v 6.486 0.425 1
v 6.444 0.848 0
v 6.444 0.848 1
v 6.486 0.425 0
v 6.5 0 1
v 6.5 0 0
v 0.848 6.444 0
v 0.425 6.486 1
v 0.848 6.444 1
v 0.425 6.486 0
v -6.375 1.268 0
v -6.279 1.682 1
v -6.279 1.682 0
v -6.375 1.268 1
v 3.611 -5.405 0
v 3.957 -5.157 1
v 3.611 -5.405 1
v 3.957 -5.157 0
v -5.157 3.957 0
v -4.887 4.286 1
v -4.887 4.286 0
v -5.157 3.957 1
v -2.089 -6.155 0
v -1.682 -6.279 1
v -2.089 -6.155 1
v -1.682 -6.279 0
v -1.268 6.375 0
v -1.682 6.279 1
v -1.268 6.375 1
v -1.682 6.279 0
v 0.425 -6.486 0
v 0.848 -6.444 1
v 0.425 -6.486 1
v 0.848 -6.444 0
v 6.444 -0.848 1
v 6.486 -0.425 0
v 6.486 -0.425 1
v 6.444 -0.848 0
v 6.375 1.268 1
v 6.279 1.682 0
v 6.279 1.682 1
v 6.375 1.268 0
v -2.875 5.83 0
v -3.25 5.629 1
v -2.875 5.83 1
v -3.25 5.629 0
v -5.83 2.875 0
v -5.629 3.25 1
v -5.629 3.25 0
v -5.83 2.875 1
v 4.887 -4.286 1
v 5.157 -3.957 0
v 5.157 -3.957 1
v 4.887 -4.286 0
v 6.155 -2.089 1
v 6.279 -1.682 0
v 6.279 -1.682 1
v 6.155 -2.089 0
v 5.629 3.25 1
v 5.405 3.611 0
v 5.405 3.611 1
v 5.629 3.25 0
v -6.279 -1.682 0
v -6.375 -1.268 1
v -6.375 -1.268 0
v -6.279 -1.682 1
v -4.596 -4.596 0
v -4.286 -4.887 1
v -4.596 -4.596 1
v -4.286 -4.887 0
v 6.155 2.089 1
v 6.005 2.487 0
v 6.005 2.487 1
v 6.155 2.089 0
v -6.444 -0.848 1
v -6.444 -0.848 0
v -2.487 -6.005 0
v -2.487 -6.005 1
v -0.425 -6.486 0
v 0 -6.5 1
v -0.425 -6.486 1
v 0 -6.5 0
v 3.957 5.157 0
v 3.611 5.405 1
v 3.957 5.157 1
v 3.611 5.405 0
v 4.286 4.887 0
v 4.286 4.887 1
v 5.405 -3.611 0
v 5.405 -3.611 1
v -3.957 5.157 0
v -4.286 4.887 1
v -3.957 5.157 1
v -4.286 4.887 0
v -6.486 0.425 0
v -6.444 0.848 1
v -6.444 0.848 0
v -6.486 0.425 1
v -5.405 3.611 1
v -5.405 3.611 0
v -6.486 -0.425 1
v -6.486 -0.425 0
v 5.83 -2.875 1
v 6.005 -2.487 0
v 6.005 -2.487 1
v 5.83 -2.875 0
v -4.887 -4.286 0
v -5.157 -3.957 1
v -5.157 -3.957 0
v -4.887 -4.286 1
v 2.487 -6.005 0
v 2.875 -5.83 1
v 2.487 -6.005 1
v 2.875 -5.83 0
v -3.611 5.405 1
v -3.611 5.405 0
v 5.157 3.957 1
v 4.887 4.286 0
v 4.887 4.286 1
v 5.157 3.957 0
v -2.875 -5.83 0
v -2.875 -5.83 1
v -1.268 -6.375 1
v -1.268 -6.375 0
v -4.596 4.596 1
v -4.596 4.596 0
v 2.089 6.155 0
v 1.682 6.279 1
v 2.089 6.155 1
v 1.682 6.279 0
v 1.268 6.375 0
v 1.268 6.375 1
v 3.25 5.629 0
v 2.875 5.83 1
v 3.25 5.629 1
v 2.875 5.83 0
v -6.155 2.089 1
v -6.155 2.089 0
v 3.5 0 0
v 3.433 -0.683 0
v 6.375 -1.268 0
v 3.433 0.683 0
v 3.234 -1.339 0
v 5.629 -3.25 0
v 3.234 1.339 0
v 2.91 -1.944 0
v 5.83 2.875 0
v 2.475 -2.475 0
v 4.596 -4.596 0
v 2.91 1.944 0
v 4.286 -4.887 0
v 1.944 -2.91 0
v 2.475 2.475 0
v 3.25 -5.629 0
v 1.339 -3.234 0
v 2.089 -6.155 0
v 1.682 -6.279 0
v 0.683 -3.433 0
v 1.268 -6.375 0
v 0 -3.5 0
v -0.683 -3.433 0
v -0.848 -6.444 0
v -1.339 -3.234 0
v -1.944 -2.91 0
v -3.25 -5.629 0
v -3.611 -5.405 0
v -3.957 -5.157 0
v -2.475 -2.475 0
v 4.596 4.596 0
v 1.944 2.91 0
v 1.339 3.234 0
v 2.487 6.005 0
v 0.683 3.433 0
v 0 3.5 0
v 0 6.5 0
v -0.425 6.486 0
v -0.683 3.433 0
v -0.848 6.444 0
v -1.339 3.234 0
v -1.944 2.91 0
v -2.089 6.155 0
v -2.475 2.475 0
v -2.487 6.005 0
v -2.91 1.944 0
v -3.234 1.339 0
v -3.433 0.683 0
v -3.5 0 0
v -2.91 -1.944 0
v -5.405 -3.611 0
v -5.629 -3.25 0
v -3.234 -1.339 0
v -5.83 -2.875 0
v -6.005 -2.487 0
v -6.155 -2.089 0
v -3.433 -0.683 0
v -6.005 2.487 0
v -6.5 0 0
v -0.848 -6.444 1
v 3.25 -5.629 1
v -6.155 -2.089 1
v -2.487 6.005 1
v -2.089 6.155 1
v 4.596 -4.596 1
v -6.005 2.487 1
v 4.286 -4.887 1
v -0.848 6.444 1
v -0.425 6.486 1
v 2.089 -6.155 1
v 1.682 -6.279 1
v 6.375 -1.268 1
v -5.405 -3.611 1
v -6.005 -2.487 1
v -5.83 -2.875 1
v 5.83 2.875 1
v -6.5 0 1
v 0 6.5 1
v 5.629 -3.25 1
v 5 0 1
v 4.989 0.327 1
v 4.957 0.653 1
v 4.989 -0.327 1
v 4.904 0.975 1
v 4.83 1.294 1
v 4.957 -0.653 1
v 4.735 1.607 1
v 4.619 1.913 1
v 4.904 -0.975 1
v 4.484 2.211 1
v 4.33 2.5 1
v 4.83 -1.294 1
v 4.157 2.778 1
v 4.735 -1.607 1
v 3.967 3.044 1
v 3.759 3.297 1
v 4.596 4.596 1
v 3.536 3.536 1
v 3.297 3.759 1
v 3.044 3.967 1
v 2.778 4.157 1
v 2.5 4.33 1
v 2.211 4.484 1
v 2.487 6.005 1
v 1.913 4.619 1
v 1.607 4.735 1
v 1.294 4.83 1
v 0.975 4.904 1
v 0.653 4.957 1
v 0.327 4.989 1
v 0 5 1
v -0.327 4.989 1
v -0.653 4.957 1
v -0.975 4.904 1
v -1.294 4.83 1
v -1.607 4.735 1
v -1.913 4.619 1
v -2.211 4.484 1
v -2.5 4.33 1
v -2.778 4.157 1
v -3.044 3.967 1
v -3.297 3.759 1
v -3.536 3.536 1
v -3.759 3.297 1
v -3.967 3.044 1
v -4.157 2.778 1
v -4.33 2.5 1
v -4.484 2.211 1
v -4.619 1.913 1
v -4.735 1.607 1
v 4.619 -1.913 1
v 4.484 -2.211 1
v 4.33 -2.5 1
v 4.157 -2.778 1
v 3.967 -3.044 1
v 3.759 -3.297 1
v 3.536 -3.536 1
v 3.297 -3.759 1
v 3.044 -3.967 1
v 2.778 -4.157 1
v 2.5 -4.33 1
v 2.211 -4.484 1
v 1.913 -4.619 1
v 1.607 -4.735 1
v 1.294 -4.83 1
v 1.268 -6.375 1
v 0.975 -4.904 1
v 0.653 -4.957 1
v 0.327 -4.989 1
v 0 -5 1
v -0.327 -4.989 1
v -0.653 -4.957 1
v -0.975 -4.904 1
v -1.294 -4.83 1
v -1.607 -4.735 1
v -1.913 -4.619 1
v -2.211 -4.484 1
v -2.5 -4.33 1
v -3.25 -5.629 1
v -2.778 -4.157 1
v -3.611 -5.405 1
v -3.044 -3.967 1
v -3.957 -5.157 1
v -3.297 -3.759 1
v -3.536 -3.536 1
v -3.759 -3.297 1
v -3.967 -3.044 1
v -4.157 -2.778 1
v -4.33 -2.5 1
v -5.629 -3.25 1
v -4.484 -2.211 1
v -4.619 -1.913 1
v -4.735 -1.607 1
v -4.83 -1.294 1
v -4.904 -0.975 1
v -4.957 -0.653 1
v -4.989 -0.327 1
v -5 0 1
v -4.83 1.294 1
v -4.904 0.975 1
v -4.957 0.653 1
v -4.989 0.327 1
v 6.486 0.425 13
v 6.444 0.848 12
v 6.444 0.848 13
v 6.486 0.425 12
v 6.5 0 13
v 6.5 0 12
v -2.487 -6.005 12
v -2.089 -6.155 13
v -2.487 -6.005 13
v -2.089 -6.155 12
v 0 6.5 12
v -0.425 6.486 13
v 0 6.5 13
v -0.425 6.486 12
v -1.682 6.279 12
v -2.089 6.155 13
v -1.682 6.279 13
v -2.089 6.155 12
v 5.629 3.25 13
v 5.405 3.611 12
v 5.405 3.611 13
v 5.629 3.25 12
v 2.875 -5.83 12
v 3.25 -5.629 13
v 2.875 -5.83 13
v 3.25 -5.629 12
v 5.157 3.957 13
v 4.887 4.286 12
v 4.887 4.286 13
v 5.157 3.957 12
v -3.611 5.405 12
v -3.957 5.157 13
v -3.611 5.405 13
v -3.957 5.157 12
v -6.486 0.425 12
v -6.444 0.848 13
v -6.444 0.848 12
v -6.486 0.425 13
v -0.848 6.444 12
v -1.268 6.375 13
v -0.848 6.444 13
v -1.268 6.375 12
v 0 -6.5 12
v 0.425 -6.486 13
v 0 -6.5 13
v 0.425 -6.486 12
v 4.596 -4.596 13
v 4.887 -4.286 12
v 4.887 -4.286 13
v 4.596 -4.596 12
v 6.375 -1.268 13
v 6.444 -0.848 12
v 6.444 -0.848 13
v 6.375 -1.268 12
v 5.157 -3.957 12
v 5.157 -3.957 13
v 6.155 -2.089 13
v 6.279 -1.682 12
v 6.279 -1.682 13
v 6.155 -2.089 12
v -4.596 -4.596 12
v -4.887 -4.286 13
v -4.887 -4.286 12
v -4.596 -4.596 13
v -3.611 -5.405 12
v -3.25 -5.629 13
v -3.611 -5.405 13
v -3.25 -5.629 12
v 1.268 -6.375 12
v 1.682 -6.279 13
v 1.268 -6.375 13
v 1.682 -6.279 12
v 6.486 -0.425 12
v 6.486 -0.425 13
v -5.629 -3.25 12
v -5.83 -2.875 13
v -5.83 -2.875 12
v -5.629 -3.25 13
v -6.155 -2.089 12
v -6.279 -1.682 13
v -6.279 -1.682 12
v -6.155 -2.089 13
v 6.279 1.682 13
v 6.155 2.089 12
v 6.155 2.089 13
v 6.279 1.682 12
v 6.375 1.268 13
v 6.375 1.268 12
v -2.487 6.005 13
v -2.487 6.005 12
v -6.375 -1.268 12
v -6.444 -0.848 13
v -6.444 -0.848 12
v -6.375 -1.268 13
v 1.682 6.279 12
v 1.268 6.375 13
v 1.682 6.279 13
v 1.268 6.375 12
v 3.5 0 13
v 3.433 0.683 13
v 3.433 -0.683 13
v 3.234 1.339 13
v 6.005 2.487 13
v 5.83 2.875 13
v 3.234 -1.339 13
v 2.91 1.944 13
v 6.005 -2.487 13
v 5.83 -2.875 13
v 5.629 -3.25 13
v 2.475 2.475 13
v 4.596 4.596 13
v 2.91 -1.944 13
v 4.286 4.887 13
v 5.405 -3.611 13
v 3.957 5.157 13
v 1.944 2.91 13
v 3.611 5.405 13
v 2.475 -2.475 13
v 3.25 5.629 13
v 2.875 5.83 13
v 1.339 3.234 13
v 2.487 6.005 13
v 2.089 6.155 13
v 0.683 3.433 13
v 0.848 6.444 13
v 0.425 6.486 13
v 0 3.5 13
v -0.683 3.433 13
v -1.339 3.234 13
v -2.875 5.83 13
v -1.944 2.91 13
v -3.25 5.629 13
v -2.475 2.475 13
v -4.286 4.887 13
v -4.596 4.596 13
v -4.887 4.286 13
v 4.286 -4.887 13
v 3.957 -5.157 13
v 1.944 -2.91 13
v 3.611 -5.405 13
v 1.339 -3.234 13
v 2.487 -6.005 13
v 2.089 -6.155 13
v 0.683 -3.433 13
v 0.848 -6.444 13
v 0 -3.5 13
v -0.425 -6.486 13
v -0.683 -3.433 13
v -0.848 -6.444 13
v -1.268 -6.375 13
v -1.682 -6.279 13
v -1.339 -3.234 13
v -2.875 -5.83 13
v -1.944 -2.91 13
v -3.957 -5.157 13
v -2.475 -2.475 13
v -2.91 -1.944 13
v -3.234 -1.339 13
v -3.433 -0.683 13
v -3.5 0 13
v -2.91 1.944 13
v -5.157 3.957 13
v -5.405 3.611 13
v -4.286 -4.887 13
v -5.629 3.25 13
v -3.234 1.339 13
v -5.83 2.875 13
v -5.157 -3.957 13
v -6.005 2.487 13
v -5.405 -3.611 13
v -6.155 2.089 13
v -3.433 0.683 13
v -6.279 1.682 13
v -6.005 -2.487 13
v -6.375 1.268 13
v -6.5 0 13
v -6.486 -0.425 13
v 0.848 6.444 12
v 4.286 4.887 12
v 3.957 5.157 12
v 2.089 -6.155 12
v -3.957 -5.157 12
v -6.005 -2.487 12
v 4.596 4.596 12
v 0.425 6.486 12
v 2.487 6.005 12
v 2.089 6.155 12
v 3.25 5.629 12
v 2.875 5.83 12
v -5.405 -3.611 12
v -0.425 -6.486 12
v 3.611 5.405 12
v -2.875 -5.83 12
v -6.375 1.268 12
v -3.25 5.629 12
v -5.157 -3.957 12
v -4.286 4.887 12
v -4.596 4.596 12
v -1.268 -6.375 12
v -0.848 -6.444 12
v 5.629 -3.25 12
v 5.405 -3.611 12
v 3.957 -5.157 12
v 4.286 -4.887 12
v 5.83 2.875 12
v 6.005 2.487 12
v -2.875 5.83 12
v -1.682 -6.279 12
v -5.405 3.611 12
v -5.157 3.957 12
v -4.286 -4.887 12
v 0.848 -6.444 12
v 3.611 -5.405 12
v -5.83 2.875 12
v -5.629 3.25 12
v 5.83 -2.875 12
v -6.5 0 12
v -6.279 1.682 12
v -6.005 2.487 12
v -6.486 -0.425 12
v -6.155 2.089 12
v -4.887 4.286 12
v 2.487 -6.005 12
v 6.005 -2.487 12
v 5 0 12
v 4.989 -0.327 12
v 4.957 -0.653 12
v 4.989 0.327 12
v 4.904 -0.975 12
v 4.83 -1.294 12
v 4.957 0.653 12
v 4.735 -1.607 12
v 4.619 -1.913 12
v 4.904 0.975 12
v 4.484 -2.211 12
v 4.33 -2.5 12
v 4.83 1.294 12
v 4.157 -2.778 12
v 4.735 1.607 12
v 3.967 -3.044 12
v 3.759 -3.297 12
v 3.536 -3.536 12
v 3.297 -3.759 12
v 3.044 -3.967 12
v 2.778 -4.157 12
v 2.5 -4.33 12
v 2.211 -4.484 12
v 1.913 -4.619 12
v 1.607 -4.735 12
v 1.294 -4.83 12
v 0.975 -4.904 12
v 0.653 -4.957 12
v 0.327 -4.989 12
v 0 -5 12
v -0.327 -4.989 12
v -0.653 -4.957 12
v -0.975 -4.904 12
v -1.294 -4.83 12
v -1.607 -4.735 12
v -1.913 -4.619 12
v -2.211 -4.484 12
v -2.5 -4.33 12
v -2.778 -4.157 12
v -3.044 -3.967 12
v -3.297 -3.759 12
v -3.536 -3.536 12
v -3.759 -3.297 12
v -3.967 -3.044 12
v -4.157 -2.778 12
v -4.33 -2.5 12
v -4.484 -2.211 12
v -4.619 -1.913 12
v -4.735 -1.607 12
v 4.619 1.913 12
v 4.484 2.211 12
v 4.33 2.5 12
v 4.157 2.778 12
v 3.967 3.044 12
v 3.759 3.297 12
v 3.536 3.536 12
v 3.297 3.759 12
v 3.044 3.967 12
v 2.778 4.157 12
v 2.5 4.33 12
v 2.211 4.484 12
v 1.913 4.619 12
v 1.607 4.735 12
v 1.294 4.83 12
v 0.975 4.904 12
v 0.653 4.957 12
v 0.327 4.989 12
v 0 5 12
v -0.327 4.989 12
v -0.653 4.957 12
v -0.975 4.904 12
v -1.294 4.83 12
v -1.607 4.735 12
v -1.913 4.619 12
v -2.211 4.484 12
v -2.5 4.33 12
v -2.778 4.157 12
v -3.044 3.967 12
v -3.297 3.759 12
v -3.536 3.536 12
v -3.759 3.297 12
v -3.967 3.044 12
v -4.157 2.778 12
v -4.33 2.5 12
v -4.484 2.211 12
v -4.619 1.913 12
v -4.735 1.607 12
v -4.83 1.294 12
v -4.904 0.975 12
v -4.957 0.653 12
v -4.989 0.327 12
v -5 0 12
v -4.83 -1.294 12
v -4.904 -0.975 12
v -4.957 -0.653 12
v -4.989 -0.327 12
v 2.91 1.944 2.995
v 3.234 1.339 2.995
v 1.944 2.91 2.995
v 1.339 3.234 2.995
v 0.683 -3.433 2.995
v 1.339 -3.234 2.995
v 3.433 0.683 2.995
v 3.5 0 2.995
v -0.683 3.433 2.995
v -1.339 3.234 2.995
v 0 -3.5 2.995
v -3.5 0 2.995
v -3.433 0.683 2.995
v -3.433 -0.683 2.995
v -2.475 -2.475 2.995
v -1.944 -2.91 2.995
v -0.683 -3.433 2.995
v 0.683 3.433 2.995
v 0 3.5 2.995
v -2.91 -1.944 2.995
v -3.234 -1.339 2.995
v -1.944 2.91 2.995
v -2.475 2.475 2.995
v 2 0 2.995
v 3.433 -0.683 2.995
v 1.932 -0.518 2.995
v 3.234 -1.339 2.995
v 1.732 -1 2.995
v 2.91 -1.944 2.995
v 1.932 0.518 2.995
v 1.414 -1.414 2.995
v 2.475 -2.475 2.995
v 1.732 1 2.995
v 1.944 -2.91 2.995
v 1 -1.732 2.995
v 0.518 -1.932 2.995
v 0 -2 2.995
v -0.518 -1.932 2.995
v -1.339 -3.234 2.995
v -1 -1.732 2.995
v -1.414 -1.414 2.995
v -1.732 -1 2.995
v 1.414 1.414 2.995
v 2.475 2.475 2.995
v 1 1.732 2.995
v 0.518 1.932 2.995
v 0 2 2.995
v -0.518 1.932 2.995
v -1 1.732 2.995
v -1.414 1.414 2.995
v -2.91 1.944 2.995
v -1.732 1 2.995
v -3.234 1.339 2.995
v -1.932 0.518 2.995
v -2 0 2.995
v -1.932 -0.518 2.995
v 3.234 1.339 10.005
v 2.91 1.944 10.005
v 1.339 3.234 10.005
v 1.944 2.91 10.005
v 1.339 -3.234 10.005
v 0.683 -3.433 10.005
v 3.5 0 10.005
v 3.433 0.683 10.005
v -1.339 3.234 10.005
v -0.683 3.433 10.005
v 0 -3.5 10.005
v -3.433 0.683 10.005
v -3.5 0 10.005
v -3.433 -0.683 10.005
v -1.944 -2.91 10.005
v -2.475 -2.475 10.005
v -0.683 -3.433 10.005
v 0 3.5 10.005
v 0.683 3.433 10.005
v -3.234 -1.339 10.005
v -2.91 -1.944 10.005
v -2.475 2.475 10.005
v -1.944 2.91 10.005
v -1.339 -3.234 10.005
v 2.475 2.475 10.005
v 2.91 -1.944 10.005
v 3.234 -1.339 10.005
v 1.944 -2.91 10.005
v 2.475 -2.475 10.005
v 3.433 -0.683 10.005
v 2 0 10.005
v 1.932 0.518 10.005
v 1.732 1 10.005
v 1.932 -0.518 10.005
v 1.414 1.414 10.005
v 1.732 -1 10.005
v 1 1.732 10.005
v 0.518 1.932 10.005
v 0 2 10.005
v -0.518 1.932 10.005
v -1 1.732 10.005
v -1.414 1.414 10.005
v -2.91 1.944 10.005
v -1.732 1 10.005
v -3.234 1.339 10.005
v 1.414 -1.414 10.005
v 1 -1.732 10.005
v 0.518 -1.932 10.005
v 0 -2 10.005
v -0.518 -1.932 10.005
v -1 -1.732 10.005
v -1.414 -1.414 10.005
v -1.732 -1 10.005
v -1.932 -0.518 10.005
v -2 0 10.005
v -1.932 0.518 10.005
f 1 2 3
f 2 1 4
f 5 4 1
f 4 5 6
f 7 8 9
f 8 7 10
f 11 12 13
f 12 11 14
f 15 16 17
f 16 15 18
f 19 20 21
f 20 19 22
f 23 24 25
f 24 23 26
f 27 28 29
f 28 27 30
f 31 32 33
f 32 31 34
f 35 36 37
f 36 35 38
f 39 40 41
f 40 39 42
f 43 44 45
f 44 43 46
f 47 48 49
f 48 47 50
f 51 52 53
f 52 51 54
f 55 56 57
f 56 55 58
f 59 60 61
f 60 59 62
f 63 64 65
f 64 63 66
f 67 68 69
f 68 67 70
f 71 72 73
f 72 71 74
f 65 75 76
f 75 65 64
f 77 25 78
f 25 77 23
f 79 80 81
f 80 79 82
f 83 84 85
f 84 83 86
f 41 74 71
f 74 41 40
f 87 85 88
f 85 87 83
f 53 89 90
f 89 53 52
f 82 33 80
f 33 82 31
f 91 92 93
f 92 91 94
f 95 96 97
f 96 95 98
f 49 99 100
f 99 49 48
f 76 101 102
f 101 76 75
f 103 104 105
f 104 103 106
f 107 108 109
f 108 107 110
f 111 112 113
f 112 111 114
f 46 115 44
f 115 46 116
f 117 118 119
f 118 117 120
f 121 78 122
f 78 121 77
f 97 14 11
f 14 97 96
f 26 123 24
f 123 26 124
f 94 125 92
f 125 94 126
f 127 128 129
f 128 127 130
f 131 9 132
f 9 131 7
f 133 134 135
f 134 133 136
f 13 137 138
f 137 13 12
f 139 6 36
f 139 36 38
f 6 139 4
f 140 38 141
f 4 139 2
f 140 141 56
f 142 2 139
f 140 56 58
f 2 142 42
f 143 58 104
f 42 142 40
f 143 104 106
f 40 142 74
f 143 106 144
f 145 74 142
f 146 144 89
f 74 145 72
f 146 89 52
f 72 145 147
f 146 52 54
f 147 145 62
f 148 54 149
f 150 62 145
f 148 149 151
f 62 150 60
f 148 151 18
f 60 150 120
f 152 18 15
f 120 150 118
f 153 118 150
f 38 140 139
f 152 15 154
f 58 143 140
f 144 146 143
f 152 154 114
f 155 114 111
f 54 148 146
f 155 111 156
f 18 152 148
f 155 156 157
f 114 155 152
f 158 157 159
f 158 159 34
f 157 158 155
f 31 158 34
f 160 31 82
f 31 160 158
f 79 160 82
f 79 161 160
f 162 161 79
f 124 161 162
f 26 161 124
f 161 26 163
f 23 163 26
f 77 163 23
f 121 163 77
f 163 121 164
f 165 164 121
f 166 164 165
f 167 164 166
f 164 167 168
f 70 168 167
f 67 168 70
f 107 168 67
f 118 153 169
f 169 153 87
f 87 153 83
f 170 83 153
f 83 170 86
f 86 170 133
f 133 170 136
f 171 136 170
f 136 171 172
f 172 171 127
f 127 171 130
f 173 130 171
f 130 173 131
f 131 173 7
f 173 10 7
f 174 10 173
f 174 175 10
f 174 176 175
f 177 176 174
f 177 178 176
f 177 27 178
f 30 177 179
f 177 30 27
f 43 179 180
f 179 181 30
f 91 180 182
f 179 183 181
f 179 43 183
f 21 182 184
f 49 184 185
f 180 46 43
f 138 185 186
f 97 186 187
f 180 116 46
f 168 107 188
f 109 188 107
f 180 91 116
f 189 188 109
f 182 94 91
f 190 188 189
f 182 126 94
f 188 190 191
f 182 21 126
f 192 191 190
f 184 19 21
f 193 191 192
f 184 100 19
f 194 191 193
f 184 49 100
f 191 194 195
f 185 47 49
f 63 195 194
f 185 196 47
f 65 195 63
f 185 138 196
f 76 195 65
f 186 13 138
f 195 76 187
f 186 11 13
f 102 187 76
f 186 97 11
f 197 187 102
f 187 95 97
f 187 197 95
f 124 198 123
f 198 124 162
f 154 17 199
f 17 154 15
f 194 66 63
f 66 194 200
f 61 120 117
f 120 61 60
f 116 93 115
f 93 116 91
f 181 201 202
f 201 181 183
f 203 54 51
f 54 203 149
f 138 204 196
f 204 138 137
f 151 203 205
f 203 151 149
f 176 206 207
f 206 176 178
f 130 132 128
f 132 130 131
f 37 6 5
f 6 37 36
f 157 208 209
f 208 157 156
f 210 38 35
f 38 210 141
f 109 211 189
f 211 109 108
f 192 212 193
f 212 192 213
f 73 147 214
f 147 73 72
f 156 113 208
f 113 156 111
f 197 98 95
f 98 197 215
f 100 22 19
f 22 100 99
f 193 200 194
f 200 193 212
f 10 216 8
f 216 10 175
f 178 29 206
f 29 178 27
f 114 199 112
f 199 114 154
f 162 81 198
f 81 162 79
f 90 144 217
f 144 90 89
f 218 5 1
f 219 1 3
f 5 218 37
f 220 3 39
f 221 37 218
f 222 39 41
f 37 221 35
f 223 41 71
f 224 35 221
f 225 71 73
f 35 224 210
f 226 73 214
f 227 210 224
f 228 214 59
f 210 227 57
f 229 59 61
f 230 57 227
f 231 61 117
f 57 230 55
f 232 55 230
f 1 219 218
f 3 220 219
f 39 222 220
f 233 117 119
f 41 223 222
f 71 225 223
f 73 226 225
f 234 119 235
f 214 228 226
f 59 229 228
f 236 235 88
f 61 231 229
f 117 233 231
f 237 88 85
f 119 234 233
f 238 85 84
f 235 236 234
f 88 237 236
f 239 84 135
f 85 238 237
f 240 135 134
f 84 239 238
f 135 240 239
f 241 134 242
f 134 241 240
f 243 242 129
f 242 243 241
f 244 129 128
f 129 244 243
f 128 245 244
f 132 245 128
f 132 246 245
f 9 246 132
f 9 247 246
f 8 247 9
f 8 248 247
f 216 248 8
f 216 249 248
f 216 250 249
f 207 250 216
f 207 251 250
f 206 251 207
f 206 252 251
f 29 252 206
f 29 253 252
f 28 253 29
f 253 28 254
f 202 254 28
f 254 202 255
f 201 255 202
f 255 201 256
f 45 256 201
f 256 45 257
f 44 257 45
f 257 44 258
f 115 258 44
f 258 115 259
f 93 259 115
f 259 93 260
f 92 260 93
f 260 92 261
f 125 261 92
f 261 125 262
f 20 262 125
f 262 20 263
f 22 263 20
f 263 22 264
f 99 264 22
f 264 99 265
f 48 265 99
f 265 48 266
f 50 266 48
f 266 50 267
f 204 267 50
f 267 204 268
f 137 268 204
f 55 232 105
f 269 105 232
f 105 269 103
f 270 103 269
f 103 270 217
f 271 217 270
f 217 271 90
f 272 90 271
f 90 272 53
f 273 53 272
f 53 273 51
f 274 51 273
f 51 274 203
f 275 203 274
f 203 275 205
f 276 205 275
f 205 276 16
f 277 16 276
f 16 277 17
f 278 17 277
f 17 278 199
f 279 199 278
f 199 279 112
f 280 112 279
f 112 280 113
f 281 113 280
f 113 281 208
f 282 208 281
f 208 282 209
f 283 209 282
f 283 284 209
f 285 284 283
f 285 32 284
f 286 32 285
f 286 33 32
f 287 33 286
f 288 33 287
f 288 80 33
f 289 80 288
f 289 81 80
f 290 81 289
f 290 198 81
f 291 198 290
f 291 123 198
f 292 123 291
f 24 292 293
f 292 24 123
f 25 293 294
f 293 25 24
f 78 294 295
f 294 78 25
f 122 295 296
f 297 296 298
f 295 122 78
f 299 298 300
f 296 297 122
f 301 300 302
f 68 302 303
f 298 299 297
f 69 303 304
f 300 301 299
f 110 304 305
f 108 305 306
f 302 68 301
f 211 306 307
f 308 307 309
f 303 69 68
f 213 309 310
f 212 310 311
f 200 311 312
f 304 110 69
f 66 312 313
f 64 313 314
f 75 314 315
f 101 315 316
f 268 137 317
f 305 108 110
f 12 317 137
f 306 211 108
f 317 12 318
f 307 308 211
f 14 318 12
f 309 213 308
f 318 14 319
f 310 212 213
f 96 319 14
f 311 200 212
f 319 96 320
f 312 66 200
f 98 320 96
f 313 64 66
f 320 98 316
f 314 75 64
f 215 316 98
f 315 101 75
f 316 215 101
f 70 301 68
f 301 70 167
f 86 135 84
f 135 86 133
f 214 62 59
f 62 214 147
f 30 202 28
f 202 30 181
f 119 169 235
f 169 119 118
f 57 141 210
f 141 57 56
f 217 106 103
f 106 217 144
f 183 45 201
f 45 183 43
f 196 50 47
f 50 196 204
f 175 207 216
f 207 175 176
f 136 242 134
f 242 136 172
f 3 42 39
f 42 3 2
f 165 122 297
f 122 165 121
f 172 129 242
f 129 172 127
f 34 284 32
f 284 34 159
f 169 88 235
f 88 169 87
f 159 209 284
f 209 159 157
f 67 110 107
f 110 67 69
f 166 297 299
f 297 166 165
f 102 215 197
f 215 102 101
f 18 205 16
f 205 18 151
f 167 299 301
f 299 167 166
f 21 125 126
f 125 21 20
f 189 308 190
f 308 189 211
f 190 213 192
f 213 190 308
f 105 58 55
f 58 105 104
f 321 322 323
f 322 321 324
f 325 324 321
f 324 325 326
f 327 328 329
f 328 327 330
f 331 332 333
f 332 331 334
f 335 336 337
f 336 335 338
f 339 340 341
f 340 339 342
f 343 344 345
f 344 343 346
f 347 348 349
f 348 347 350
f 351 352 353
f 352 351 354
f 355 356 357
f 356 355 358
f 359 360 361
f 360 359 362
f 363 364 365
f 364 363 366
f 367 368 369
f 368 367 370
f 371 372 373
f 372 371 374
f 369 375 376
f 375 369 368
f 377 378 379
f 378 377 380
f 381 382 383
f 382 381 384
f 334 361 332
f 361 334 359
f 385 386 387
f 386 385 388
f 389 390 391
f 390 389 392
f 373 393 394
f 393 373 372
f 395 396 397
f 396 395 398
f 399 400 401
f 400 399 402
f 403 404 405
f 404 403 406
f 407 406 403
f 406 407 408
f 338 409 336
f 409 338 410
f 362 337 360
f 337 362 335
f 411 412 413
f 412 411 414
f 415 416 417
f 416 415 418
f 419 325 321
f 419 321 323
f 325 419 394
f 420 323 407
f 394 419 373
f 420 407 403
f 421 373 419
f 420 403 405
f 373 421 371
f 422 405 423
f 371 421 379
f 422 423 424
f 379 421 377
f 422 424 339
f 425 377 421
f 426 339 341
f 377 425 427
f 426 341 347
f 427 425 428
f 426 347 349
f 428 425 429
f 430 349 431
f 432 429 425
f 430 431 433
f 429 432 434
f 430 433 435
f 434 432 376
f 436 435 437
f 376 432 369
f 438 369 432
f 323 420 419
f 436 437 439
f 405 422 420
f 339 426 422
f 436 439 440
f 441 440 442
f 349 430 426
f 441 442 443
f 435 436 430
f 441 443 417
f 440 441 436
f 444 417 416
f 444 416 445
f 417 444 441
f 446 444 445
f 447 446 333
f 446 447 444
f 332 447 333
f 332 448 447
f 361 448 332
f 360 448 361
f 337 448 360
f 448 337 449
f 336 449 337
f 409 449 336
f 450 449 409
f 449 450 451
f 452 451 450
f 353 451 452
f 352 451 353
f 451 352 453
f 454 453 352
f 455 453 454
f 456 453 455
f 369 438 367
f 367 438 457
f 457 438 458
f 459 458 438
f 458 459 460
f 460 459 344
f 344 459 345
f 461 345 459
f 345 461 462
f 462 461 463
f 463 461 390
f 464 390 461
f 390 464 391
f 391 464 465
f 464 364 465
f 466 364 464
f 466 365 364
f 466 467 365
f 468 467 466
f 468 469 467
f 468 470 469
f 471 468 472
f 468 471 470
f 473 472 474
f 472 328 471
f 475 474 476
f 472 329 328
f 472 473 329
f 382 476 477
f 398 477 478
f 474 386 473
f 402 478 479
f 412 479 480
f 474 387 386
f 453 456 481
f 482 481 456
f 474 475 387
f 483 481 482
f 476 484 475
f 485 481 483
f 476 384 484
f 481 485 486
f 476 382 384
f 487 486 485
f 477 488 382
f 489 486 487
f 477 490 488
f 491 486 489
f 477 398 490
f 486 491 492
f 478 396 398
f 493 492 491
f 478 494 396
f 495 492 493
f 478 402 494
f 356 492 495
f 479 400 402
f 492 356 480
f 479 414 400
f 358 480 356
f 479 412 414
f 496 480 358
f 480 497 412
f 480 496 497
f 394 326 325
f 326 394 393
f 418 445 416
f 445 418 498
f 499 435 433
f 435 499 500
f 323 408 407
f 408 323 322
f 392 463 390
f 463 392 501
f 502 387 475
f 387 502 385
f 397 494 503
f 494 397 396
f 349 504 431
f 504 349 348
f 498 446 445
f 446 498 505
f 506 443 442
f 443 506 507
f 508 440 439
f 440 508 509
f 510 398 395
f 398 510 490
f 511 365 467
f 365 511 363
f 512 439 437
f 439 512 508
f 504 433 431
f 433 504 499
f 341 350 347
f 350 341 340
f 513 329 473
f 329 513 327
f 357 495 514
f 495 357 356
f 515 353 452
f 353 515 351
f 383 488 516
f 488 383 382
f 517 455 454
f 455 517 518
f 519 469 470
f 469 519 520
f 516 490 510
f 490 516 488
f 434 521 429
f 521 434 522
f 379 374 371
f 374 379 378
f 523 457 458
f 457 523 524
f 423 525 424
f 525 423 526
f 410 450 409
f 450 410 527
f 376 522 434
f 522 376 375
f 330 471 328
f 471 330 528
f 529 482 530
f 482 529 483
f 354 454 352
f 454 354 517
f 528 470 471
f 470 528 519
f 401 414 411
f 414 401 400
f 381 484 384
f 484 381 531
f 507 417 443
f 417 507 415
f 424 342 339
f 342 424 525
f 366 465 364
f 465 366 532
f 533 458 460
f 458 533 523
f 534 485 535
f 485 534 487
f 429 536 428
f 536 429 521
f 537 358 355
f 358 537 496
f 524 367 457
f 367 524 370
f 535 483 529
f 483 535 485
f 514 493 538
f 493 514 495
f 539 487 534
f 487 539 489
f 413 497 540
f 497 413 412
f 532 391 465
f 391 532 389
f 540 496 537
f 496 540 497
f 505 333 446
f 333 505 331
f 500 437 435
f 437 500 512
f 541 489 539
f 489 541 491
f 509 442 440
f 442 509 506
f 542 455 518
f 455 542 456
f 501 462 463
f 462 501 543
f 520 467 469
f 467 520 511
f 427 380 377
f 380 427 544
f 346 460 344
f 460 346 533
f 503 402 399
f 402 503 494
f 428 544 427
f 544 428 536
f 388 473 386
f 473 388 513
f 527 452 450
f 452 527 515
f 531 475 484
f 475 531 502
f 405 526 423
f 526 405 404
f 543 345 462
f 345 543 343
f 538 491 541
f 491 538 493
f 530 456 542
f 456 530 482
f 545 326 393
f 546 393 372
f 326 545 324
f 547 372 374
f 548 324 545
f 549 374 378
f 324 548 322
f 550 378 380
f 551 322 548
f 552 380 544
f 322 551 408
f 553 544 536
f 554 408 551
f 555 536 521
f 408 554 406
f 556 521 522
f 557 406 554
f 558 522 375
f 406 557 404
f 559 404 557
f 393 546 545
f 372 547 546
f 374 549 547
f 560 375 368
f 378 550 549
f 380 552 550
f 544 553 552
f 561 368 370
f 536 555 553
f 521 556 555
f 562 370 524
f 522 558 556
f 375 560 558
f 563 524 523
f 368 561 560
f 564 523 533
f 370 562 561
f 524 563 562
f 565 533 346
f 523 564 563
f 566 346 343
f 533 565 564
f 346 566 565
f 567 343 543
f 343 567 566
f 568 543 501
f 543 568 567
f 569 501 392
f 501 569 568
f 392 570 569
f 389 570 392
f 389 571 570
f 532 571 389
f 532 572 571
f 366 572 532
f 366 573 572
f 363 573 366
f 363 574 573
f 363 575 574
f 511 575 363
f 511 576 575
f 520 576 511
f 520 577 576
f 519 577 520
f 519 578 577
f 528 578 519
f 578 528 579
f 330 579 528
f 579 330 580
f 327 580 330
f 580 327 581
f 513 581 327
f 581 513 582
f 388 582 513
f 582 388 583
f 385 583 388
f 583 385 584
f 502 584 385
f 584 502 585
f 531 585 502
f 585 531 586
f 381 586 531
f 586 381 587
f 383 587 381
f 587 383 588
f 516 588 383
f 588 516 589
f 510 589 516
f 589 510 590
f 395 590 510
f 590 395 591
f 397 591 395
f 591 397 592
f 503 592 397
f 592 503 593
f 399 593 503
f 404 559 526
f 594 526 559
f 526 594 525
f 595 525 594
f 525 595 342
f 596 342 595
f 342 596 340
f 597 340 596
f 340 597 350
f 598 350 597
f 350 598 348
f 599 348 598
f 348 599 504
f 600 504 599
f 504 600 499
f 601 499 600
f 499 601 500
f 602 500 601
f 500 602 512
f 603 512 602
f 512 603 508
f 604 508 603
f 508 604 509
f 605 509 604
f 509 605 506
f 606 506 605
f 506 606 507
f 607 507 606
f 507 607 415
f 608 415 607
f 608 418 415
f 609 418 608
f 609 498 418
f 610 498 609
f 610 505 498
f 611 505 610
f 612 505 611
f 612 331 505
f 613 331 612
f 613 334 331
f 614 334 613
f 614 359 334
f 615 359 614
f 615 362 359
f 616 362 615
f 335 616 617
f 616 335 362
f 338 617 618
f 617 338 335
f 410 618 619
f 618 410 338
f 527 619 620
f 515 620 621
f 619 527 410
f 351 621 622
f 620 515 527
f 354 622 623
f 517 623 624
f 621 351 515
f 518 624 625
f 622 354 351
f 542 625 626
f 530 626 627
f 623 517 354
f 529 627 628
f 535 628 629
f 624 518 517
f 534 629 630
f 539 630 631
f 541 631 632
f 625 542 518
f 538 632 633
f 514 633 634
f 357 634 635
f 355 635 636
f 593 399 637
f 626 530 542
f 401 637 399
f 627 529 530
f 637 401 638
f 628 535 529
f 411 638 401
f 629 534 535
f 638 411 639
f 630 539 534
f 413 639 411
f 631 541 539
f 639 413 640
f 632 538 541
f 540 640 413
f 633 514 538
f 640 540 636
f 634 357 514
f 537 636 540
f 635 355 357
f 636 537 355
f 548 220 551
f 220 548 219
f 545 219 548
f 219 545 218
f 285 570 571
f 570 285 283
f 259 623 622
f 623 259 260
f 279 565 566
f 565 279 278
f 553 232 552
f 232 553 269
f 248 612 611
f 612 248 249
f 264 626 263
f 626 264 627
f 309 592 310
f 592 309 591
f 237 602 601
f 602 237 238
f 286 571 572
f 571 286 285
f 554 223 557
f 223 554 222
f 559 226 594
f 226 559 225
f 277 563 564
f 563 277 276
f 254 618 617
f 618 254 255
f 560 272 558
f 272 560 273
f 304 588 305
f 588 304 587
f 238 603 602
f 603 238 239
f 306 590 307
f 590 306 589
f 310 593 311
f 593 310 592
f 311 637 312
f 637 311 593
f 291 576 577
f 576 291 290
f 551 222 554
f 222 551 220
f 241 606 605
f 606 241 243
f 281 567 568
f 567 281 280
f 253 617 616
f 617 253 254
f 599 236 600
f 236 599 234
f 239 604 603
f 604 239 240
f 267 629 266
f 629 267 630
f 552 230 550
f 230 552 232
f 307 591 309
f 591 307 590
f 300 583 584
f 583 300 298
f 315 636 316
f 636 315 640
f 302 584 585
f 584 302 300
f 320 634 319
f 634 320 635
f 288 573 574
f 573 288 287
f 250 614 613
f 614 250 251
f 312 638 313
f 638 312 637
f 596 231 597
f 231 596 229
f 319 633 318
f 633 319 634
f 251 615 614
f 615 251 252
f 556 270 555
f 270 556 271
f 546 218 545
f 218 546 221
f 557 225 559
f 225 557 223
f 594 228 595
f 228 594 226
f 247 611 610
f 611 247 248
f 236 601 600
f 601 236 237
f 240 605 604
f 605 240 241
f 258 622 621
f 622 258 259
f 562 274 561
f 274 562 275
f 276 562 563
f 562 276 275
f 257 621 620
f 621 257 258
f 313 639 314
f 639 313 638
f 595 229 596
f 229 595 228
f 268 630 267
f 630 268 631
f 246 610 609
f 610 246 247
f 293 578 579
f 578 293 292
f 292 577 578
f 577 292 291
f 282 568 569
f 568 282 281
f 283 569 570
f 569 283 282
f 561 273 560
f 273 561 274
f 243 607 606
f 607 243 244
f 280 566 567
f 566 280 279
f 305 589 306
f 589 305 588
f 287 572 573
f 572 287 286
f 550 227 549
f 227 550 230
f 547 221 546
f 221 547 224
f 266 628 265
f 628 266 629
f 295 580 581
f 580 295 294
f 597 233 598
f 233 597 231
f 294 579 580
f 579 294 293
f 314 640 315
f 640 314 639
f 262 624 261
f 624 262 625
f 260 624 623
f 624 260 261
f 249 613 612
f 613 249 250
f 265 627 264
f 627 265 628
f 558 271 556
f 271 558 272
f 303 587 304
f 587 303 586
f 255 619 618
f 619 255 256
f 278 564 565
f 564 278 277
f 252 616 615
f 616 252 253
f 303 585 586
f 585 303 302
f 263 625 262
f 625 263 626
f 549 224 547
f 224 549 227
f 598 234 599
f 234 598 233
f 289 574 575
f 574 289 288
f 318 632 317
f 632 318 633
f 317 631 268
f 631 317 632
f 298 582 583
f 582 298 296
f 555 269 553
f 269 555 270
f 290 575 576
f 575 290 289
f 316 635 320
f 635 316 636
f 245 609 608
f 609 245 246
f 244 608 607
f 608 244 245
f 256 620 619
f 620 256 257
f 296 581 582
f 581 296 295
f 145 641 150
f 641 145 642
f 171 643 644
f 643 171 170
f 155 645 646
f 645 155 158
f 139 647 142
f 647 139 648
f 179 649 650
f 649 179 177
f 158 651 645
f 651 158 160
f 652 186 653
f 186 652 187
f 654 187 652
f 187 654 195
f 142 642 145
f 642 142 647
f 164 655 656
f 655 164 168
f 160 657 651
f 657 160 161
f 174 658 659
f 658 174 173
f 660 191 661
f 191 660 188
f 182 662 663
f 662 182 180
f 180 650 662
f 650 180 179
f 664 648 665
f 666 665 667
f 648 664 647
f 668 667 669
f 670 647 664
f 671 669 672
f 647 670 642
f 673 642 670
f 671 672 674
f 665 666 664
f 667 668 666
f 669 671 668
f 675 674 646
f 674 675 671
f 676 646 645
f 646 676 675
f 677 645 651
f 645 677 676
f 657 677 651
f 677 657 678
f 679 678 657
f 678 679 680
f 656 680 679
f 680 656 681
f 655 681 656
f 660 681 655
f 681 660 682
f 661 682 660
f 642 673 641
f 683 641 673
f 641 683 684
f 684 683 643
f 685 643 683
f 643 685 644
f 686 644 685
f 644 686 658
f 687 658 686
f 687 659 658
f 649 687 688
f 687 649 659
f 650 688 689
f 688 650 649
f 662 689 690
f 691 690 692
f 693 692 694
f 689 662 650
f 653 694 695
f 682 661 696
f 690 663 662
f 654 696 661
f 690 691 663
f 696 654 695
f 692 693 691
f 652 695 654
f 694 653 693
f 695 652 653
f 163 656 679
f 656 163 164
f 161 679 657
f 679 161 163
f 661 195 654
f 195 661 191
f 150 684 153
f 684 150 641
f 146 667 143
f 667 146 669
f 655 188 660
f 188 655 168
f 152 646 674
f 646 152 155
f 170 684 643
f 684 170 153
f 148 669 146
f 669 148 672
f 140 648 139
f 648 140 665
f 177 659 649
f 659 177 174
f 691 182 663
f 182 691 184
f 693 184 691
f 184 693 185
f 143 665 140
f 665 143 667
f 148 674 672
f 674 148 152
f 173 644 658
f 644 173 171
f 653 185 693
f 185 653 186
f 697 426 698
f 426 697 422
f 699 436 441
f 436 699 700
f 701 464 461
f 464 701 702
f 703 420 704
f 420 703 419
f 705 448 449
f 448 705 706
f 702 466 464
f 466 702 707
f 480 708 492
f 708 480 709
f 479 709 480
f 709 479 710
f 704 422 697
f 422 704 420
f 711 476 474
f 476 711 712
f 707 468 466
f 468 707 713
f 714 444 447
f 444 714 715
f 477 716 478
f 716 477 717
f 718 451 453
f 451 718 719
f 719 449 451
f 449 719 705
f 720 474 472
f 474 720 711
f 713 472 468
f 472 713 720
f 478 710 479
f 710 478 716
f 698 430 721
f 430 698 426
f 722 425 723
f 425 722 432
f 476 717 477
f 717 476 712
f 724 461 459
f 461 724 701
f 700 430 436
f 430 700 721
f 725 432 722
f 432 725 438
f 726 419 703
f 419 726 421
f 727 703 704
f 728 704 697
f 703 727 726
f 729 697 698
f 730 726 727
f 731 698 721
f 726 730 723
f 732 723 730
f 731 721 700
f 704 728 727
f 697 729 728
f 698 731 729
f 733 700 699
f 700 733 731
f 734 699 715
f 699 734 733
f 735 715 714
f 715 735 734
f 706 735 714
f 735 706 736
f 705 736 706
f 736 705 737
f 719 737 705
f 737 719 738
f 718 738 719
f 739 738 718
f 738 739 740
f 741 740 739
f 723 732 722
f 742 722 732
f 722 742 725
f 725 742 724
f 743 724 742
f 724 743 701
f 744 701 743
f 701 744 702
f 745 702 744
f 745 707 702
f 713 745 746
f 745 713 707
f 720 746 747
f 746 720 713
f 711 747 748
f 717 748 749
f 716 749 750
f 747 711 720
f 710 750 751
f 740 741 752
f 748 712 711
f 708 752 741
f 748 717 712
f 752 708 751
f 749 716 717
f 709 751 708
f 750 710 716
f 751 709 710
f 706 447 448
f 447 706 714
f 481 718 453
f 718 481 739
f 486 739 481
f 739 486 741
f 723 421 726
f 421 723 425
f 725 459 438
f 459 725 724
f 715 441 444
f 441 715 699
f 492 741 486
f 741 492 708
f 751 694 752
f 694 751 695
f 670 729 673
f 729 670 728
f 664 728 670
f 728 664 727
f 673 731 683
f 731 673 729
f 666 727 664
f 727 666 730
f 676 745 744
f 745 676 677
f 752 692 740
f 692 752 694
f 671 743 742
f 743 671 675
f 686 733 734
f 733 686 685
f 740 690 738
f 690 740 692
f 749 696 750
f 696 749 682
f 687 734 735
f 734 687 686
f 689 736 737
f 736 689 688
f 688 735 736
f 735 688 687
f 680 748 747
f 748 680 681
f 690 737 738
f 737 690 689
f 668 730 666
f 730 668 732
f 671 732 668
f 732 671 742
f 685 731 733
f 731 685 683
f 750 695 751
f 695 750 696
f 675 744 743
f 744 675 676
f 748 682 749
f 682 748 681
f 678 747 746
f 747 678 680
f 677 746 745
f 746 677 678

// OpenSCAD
// file: wrist_params.scad
// Shared parameters and helpers for the belt-driven wrist.
// Every part file includes this, so change values here.
//
// Frames (mm):
//   origin = intersection of the pitch and roll axes
//   pitch axis = X  (yoke turns in the two legs on 6709 bearings)
//   roll  axis = yoke Z (cup turns in the yoke on 6709 bearings)
//   legs clamp onto a vertical 20x20 square rod along -Z
//   pitch side = -X (pulley outside the left leg)
//   roll side  = +X (belt leaves through the hollow right stub)
//
// Roll belt path: cup drum -> yoke idler -> along the pitch axis through the
// right stub -> leg idler -> down to the roll motor, and back the same way on
// the other side. Both runs lie along the pitch axis, so pitching the yoke only
// twists them and does not turn the cup.

$fn = 96;

/* [Bearings] */
b6709 = [45, 55, 6];        // main bearings, 6709-2RS (bore, OD, width), x4
idler_bearing = [3, 7, 3];  // 7x3x3 (bore, OD, width), two per idler
fit = 0.0;                  // extra clearance added to bearing seats

/* [HTD 5M belt] */
belt_pitch = 5;
roll_belt_w  = 10;
pitch_belt_w = 10;         // same as elbow/pulleys.scad
function band_h(w) = w + 1.5;   // toothed band on pulleys, as in elbow/pulleys.scad
roll_band_h  = band_h(roll_belt_w);
pitch_band_h = band_h(pitch_belt_w);
htd_pld    = 0.5715;        // pitch line to pulley outer diameter
htd_depth  = 2.06;          // tooth depth
htd_groove_r = 1.49;
belt_back  = 1.17;          // pitch line to back of belt
belt_tip   = htd_pld + htd_depth;  // pitch line to tooth tips

drum_teeth  = 30;           // roll drum on the cup
pitch_teeth = 60;           // pitch pulley on the yoke shaft; 3:1 with a 20T motor pulley
motor_teeth = 20;           // motor pulleys (for belt lengths and the assembly view)
motor_drop  = 150;          // motor shafts below the pitch axis

/* [Idlers] */
idler_r      = 5;           // belt contact radius (smooth)
idler_flange = 1.5;         // flange overhang
idler_band   = roll_belt_w + 1;
idler_fl_t   = 1;
idler_w      = idler_band + 2 * idler_fl_t;

/* [Yoke] */
yoke_r        = b6709[1] / 2 + 6.5;  // outer radius of the ring
yoke_chamfer  = [2.7, 3.5];          // outer edge chamfer (radial, axial)
cup_bearing_z = 13.5;                 // cup bearing centres, +/- from the pitch axis
yoke_h        = 2 * (cup_bearing_z + b6709[2] / 2 + 2);   // 2 mm lips over the bearings

/* [Roll belt routing] */
run_y      = 10.5;          // pitch lines of the two roll runs, +/- from the pitch axis;
                            // the runs pass closest at mid-twist at pitch +/-90 (belt_check both_runs)
yoke_idler = [yoke_r - 6, run_y + belt_back + idler_r];   // yoke frame (x, +/-y), axis = yoke Z
// Twist length, yoke idler to leg idler. Edge stretch at 180 deg of twist
// (pitch -90) is about 3.4 % for a 10 mm belt; 80 would bring it to 1.9 %.
twist_len  = 60;
leg_idler  = [yoke_idler.x + twist_len, -(idler_r + (belt_tip + belt_back) / 2)];  // (x, z), axis = Y
yoke_block_y = yoke_idler.y + idler_r + idler_flange + 1.5;  // half width of the blocks either side of the ring

assert(run_y - idler_w / 2 >= 2, "roll leg idlers hit the centre rib, raise run_y");

/* [Pins] */
pin_d      = 3;
pin_hole_d = 2.9;           // press fit in the roll leg

/* [Mounting rod] */
rod_w   = 20;
rod_gap = rod_w + 0.2;
rod_len = 200;

/* [Shared positions] */
leg_x         = [yoke_r + 3, yoke_r + 3 + b6709[2] + 5];   // leg disc inner / outer face
pitch_pulley_x = leg_x[1] + 1;  // pulley starts this far out on the -X side
pitch_shaft_r  = b6709[0] / 2 - 2.5;   // shaft the pulley slides onto
pitch_screw_pcd = 24;       // 3x M3 axial screws, pulley -> shaft end
pitch_fl_t     = 1.5;
pitch_plate_t  = 3;
pitch_pulley_len = 2 * pitch_fl_t + pitch_band_h;
pitch_shaft_end  = pitch_pulley_x + pitch_pulley_len;

// furthest the yoke ring reaches from the pitch axis at x, over any pitch angle
function yoke_sweep_r(x) = sqrt(max(0, pow(yoke_r, 2) + pow(yoke_h / 2 - yoke_chamfer[1], 2) - x * x));
rod_top = -round(yoke_sweep_r(0) + 2.5);

// rod clamp on each leg: 2x2 M3, top row this far below the rod top
rod_bolt_pitch = 11;        // square, centre to centre
rod_bolt_top   = 6;
rod_bolt_edge  = 12;        // lower bolt centres to the bottom of the leg
leg_bottom = rod_top - rod_bolt_top - rod_bolt_pitch - rod_bolt_edge;

eps = 0.01;

// ---------------------------------------------------------------- HTD 5M

function htd_rp(t) = t * belt_pitch / (2 * PI);
function htd_ro(t) = htd_rp(t) - htd_pld;
function htd_root(t) = htd_ro(t) - htd_depth;

// toothed disc, same profile as elbow/htd-pulley.scad
module htd_teeth(t, h, center = false) {
    linear_extrude(h, center = center) difference() {
        circle(r = htd_ro(t), $fn = max(36, t * 4));
        for (i = [0 : t - 1]) rotate(i * 360 / t)
            translate([htd_ro(t) - htd_depth + htd_groove_r, 0]) circle(r = htd_groove_r, $fn = 16);
    }
}

// ---------------------------------------------------------------- roll belt geometry
// Crossed tangent from the drum (pitch circle) to the +y yoke idler.
// Returns [point on drum, point on idler], yoke frame, z = 0.

function roll_tangent() = let(
    c = yoke_idler, R = htd_rp(drum_teeth), rho = idler_r + belt_back,
    d = norm(c), b = atan2(c.y, c.x),
    g = b - acos(-(R + rho) / d), n = [cos(g), sin(g)])
    [-R * n, c + rho * n];

assert(norm(yoke_idler) > htd_rp(drum_teeth) + idler_r + belt_back,
       "yoke idler too close to the drum");
assert(norm(yoke_idler) > htd_ro(drum_teeth) + 1 + idler_r + idler_flange + 0.5,
       "yoke idler hits the drum flange");

function roll_belt_length() = let(
    t = roll_tangent(), R = htd_rp(drum_teeth), rho = idler_r + belt_back,
    a1 = atan2(t[0].y, t[0].x),
    drum = R * (360 - 2 * a1) * PI / 180,
    seg = norm(t[1] - t[0]),
    ia = 270 - (atan2(t[1].y - yoke_idler.y, t[1].x - yoke_idler.x) + 360) % 360,
    idl = rho * ia * PI / 180,
    xrun = leg_idler.x - yoke_idler.x,
    lrho = -leg_idler.y,
    leg = lrho * PI / 2,
    rm = htd_rp(motor_teeth),
    down = norm([motor_drop + leg_idler.y, rm - run_y]),
    mot = PI * rm)
    drum + mot + 2 * (seg + idl + xrun + leg + down);

function pitch_belt_length() = let(r1 = htd_rp(pitch_teeth), r2 = htd_rp(motor_teeth), c = motor_drop)
    2 * c + PI * (r1 + r2) + pow(r1 - r2, 2) / c;

// ---------------------------------------------------------------- helpers

module along_x() rotate([0, 90, 0]) children();
module along_y() rotate([-90, 0, 0]) children();

// revolve an (axial, r) profile around the X axis
module revolve_x(pts) along_x() rotate_extrude() polygon([for (p = pts) [p[1], p[0]]]);

module tube(d_in, d_out, h, center = false) difference() {
    cylinder(d = d_out, h = h, center = center);
    translate([0, 0, center ? 0 : -1]) cylinder(d = d_in, h = h + 2, center = center);
}

module bearing(b) color("silver") render() tube(b[0], b[1], b[2], center = true);
// main file
// Smooth flanged belt idler on two 7x3x3 bearings and a 3 mm pin. Print 4:
// 2 in the yoke, 2 on the roll leg.

include <wrist_params.scad>

orient_for_print = true;

module idler() {
    difference() {
        union() {
            cylinder(r = idler_r, h = idler_band, center = true);
            for (s = [-1, 1]) translate([0, 0, s * (idler_band + idler_fl_t) / 2])
                cylinder(r = idler_r + idler_flange, h = idler_fl_t, center = true);
        }
        cylinder(d = pin_d + 1, h = idler_w + 1, center = true, $fn = 24);
        // bearing seats from both faces
        for (s = [-1, 1]) translate([0, 0, s * (idler_w / 2 - idler_bearing[2] / 2 + eps)])
            cylinder(d = idler_bearing[1] + fit, h = idler_bearing[2] + eps, center = true, $fn = 32);
    }
}

if (orient_for_print) translate([0, 0, idler_w / 2]) idler();
else idler();
